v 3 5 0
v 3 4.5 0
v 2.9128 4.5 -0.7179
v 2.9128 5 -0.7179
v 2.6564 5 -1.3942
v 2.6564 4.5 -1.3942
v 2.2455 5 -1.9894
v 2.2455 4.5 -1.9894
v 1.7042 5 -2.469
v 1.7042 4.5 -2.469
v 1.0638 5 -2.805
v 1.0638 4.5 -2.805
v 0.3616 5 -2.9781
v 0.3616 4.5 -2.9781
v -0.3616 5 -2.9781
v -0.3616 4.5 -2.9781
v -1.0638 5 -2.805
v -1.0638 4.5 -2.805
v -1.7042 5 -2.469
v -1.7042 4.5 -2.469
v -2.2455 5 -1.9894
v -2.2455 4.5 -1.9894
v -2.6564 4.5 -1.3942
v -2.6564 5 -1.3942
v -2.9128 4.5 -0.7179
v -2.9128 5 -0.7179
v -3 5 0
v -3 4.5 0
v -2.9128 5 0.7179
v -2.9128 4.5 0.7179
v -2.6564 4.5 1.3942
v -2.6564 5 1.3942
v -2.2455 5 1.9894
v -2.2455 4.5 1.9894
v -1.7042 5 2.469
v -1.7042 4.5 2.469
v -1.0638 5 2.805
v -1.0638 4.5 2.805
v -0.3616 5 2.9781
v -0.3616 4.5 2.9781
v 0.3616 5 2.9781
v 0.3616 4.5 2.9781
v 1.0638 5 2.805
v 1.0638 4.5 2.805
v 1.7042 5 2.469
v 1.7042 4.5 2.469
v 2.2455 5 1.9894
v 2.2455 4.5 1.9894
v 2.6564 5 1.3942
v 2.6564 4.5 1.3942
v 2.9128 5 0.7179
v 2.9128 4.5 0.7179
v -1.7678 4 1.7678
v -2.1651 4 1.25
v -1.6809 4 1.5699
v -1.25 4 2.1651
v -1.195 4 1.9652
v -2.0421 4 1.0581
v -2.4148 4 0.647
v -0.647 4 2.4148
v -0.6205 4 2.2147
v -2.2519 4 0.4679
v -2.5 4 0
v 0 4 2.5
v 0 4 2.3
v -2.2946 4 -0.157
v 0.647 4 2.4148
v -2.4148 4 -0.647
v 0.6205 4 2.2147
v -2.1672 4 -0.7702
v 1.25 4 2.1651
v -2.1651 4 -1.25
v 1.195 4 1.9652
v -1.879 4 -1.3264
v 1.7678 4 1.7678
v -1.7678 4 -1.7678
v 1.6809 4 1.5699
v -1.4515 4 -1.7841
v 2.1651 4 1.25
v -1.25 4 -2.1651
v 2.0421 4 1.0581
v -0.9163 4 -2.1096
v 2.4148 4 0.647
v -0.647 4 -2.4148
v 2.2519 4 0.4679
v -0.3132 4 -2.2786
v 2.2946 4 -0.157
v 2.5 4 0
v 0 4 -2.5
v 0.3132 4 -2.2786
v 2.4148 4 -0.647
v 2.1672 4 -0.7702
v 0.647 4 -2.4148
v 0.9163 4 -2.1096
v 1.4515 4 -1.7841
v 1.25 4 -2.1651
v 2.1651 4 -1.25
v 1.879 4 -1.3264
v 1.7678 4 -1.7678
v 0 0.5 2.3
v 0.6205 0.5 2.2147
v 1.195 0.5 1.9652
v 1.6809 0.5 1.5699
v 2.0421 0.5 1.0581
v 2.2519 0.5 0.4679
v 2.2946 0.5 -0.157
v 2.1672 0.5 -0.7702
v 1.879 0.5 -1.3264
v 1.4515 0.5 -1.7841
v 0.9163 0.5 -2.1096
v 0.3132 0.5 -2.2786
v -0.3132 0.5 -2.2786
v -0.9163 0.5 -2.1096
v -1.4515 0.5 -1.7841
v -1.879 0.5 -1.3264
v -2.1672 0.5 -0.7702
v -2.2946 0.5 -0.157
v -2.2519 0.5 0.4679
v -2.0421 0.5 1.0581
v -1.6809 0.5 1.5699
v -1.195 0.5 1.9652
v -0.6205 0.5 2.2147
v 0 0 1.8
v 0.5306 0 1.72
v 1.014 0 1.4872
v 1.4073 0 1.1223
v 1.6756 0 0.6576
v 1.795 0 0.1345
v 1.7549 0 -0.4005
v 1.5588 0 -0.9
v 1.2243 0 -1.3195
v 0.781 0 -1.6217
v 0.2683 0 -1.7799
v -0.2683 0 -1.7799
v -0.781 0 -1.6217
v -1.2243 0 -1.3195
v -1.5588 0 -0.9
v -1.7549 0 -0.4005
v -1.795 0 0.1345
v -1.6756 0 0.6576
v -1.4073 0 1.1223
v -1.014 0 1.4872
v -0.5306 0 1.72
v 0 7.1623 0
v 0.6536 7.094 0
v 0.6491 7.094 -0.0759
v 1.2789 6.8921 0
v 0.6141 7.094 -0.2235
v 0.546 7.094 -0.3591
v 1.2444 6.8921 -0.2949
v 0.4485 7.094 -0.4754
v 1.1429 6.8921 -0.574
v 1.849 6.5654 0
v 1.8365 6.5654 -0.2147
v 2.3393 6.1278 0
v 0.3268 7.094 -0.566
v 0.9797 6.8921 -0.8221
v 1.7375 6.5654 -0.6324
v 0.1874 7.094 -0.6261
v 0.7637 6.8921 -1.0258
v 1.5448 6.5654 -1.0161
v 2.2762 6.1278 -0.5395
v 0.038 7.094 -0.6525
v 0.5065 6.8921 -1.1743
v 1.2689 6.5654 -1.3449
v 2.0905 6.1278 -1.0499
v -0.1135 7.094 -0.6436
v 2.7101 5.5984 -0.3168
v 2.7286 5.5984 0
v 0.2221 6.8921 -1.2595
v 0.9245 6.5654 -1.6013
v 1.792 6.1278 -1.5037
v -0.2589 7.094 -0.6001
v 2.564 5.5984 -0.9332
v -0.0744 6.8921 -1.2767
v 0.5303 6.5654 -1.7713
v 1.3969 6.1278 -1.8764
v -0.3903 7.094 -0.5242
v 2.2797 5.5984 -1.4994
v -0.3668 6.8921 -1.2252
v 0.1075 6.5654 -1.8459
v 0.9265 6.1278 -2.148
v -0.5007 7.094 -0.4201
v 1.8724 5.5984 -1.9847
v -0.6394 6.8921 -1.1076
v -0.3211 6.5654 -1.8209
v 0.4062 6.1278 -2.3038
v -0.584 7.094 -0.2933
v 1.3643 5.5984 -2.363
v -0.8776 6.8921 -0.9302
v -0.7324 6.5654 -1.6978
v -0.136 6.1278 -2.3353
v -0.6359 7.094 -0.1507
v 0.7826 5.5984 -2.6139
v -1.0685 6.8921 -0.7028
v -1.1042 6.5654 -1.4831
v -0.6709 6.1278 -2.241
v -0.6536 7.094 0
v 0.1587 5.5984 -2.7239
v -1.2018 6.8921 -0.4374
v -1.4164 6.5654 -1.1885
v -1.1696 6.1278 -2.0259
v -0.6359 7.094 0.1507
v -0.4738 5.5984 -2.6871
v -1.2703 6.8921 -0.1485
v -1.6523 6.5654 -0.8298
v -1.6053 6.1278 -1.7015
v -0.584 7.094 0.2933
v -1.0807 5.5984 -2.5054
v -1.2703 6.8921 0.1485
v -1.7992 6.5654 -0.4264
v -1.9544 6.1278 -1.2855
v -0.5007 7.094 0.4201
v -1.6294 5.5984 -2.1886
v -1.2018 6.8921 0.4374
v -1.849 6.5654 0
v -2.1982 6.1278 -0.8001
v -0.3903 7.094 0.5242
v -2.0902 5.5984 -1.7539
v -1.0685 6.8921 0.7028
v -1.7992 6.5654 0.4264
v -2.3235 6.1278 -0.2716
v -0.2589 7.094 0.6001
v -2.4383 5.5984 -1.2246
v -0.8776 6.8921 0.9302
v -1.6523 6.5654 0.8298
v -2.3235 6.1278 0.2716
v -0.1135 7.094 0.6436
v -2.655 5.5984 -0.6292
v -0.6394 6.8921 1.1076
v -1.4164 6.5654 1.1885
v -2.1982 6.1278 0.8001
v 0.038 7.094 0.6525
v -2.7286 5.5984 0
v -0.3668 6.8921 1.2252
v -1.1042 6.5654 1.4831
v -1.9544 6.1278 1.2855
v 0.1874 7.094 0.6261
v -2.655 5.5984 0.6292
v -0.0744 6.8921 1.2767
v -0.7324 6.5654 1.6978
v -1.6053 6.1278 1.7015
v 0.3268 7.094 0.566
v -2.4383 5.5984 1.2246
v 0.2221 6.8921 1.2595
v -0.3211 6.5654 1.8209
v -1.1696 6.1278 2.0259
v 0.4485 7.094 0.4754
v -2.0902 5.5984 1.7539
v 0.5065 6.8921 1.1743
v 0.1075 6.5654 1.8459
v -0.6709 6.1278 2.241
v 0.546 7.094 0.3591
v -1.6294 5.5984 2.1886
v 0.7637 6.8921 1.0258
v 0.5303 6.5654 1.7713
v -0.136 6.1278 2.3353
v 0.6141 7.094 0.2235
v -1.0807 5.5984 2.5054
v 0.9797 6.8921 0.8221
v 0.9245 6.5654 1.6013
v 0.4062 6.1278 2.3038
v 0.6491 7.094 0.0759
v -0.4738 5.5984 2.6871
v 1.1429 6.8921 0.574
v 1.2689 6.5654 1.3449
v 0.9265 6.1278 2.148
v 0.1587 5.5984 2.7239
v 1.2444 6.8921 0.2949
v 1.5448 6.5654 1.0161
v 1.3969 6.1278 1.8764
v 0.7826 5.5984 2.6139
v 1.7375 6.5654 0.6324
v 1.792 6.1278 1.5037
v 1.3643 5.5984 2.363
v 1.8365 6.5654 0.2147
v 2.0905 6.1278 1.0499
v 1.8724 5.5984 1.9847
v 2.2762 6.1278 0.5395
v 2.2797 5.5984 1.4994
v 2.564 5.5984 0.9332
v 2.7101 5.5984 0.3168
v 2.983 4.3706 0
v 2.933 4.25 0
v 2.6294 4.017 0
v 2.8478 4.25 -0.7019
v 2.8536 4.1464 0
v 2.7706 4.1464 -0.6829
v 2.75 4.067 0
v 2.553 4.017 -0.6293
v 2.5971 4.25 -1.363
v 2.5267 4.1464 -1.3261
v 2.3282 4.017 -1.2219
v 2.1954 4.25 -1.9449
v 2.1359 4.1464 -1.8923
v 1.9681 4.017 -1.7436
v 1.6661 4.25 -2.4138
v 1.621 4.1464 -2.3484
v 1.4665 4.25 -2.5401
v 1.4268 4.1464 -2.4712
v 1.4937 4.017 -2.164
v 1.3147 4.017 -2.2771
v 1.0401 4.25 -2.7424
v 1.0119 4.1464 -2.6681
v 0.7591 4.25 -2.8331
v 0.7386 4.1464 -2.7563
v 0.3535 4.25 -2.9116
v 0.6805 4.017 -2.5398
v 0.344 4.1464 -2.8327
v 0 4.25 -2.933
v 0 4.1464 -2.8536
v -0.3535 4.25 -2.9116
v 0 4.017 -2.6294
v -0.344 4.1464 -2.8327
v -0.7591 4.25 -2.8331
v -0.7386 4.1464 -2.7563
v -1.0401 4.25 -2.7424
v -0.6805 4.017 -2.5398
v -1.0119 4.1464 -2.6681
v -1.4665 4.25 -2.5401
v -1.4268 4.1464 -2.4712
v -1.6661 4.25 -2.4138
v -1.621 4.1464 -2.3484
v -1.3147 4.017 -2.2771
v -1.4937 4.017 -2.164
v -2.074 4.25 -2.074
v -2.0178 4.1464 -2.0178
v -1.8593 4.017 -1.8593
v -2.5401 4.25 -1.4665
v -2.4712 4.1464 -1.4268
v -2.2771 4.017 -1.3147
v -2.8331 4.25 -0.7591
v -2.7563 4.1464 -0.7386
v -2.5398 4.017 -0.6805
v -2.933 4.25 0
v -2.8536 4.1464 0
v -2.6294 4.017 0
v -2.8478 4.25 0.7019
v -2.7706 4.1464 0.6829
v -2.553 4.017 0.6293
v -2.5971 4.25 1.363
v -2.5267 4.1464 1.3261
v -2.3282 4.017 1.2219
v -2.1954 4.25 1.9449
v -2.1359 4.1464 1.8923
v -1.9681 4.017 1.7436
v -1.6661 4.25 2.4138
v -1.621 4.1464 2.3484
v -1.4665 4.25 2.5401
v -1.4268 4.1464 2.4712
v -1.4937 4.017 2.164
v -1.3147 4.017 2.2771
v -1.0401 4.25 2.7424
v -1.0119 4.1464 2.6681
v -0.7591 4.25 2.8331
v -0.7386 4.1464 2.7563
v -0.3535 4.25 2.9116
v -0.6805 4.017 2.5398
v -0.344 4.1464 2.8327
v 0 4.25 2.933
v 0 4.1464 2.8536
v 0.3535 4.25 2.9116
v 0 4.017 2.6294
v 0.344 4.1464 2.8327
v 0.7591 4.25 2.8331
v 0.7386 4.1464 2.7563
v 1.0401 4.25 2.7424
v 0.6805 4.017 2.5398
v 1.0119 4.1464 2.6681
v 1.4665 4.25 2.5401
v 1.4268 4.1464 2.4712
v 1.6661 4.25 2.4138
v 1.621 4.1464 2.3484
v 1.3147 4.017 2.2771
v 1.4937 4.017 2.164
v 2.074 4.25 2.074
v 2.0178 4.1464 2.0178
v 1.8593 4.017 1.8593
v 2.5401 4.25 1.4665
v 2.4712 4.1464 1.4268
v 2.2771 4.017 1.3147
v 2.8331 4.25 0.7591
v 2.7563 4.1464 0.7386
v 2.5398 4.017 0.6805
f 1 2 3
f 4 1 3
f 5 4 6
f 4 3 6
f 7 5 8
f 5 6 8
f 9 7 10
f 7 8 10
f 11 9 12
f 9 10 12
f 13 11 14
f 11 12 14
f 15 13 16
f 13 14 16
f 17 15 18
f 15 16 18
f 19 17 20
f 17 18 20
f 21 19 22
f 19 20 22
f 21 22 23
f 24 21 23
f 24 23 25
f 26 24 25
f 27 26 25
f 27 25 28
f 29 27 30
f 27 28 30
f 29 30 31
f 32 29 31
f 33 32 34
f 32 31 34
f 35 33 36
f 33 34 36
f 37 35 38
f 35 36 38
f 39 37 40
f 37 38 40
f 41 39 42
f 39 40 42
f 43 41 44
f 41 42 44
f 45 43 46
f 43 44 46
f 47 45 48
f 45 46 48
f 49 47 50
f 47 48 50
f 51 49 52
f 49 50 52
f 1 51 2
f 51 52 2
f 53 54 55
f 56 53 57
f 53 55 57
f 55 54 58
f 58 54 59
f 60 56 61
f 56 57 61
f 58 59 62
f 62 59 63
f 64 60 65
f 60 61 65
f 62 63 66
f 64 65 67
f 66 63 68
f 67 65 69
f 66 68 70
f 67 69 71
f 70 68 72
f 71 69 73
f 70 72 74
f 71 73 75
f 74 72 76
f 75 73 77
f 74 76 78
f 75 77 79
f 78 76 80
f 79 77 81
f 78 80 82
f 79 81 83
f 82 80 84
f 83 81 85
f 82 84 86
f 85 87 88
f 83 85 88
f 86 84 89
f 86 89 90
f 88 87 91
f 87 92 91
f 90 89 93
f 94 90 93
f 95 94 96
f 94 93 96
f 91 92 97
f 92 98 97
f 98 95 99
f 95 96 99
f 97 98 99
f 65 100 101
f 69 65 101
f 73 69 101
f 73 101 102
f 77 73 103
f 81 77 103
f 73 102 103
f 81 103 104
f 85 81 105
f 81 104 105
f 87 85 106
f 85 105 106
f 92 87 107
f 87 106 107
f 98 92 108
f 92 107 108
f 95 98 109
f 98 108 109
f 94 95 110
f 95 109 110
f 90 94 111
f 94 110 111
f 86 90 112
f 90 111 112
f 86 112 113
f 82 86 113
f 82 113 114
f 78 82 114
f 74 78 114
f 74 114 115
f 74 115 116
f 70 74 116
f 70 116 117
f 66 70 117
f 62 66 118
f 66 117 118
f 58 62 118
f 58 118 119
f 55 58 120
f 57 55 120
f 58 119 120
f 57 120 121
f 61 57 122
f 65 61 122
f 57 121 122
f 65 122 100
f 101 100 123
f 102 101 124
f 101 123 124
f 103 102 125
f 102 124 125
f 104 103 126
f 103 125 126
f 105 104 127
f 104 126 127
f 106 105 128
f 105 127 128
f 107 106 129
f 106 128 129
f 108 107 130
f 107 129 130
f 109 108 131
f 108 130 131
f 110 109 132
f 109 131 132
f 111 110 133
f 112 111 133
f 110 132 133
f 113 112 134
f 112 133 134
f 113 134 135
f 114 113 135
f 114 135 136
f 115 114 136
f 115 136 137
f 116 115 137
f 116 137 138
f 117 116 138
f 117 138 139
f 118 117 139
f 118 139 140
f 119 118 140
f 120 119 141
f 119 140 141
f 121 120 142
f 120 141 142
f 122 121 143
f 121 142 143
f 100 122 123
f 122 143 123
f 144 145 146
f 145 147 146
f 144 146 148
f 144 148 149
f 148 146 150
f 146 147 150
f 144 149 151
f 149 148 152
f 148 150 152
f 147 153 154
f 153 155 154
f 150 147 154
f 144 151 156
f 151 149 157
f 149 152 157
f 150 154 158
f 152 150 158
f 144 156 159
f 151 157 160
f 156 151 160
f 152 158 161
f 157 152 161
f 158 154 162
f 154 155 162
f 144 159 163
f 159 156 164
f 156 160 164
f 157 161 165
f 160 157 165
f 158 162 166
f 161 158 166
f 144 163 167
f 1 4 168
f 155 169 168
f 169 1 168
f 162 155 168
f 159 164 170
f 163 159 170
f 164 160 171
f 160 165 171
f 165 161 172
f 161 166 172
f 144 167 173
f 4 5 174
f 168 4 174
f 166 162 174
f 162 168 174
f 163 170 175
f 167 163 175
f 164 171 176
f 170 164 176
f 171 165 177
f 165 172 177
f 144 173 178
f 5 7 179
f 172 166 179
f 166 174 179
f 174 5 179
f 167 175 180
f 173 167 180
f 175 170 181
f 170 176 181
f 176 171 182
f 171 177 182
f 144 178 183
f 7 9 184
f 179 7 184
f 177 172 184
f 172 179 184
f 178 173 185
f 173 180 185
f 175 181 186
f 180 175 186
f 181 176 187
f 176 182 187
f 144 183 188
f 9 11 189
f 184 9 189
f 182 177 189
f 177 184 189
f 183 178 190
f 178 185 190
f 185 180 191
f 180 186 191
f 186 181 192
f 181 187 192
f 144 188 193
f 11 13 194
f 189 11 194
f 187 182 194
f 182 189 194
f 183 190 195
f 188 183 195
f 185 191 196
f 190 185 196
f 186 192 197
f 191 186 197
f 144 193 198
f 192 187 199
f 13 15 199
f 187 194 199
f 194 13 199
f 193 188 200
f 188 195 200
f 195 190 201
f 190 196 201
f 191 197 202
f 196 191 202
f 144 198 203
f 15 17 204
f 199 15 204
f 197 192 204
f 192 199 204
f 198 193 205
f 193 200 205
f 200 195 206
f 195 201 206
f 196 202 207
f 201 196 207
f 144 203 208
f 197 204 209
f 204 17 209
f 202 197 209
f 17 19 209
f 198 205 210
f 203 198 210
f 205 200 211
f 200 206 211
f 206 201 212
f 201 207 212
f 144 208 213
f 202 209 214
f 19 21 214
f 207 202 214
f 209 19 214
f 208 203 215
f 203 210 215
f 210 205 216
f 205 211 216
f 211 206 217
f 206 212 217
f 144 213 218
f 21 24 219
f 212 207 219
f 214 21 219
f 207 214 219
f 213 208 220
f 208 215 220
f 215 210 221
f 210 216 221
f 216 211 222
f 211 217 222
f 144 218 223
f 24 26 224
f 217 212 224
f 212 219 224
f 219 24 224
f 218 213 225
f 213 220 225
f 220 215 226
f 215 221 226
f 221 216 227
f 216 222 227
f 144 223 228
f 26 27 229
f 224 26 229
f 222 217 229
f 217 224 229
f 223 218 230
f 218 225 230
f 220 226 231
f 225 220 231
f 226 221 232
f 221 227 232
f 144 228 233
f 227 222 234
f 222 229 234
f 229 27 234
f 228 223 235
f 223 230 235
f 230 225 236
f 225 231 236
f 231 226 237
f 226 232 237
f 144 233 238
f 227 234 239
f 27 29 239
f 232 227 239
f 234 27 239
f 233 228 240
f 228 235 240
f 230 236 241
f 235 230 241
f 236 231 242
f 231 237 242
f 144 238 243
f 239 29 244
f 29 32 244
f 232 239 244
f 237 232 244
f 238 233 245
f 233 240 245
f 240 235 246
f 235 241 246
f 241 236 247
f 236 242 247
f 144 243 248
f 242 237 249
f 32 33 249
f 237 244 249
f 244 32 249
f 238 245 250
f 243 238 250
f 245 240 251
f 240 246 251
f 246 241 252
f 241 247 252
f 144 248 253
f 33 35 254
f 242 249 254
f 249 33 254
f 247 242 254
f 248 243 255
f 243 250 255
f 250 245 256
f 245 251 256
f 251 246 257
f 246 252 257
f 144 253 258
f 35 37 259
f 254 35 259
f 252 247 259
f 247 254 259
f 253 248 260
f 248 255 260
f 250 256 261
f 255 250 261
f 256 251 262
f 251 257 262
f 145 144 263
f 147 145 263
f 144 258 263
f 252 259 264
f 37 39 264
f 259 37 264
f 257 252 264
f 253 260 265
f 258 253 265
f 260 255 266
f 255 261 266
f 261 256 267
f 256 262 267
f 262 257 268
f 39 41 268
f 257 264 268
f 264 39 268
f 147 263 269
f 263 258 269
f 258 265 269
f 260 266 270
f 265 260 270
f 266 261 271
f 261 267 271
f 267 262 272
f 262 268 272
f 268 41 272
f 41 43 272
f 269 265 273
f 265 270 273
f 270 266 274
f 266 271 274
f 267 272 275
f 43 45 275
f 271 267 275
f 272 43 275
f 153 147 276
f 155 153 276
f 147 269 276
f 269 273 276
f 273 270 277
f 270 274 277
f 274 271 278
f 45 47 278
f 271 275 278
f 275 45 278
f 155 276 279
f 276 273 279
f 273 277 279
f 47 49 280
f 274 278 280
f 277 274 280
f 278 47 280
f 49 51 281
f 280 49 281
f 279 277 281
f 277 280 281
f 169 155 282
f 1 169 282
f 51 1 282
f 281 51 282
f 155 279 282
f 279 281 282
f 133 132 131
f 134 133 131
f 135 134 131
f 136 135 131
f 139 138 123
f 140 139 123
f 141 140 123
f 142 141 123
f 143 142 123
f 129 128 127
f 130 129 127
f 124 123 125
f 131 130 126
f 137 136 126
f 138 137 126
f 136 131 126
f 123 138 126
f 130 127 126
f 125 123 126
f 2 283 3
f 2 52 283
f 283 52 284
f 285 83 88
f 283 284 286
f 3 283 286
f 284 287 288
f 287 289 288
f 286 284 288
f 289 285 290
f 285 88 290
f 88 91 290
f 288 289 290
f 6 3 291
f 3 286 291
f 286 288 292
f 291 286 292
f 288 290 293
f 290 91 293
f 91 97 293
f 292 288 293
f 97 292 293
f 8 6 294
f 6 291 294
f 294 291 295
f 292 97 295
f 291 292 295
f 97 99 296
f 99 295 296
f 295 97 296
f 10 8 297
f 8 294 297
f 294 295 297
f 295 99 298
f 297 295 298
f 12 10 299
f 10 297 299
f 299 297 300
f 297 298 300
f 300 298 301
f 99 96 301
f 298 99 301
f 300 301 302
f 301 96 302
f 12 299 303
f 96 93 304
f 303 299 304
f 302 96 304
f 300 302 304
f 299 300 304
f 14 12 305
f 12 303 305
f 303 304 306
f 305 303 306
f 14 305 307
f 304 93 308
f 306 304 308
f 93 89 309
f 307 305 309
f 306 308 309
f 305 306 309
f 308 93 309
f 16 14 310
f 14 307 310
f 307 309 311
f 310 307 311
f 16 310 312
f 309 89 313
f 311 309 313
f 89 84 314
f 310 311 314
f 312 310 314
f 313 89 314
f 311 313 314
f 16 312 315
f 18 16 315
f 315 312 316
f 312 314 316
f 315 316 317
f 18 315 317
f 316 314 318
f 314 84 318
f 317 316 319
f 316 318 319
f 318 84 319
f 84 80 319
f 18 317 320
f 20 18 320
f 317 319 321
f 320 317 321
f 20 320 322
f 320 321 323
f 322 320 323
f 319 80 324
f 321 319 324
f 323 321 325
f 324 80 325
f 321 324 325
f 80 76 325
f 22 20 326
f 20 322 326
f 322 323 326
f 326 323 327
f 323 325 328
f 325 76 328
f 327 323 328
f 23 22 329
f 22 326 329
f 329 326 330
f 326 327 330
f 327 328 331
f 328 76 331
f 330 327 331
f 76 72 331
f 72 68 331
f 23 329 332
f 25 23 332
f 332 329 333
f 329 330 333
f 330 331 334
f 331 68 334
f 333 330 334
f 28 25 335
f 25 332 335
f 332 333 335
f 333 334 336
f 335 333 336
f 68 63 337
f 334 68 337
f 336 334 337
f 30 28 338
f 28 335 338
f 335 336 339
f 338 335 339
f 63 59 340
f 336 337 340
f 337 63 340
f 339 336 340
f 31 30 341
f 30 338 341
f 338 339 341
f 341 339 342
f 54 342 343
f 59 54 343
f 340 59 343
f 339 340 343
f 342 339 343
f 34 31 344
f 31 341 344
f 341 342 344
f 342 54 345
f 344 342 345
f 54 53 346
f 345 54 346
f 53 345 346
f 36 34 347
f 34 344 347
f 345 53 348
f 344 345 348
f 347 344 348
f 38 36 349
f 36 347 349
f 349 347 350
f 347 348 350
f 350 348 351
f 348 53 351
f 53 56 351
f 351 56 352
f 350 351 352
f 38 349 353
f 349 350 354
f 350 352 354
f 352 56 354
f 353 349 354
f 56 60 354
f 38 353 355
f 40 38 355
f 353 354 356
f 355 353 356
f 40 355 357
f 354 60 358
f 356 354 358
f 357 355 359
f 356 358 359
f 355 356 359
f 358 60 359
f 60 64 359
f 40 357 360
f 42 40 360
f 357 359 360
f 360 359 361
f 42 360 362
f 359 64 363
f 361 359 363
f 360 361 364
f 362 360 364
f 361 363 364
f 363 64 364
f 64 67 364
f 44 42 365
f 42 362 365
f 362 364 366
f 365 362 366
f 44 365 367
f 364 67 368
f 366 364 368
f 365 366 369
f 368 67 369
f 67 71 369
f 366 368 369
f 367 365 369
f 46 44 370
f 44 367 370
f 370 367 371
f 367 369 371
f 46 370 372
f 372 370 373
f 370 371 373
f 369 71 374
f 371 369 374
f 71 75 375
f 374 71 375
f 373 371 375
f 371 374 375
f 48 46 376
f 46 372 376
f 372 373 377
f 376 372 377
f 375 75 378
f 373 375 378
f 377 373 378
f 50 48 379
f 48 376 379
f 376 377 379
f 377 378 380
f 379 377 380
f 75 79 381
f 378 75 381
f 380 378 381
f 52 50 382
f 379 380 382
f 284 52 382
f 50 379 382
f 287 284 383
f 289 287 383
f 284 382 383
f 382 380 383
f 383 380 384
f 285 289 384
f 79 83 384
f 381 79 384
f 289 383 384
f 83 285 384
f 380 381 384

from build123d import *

# Parameters (mm, degrees)
SKETCH1_R           = 2.3
BOSS_EXTRUDE1_DEPTH = 4
FILLET1_R           = 0.5
CHAMFER1_SIZE       = 0.5


with BuildPart() as part:
    # Sketch1 → Boss-Extrude1 (new body)
    with BuildSketch(Plane(origin=(0, 0, 0), x_dir=(1, 0, 0), z_dir=(0, 1, 0))):
        with Locations(Location((0, 0, 0), (0, 0, 270))):
            Circle(SKETCH1_R)
    extrude(amount=BOSS_EXTRUDE1_DEPTH)

    # Sketch2 → Revolve1 (revolve)
    with BuildSketch(Plane.XY, mode=Mode.PRIVATE) as revolve1_sk:
        with BuildLine():
            Line((-3, 5), (-3, 4))
            Line((-3, 4), (0, 4))
            Line((0, 4), (0, 7.16227766))
            ThreePointArc((0, 7.16227766), (-1.849016271, 6.565373039), (-3, 5))
        make_face()
    revolve(revolve1_sk.sketch.rotate(Axis((0, -2.040480146, 0), (0, 1, 0)), 180), axis=Axis((0, -2.040480146, 0), (0, 1, 0)))

    # Fillet1
    fillet1_edges = [part.edges().sort_by_distance(p)[0] for p in [
        (-3, 4, 0),
    ]]
    fillet(fillet1_edges, radius=FILLET1_R)

    # Chamfer1
    chamfer1_edges = [part.edges().sort_by_distance(p)[0] for p in [
        (0, 0, -2.3),
    ]]
    chamfer(chamfer1_edges, length=CHAMFER1_SIZE)


solid = part.part
